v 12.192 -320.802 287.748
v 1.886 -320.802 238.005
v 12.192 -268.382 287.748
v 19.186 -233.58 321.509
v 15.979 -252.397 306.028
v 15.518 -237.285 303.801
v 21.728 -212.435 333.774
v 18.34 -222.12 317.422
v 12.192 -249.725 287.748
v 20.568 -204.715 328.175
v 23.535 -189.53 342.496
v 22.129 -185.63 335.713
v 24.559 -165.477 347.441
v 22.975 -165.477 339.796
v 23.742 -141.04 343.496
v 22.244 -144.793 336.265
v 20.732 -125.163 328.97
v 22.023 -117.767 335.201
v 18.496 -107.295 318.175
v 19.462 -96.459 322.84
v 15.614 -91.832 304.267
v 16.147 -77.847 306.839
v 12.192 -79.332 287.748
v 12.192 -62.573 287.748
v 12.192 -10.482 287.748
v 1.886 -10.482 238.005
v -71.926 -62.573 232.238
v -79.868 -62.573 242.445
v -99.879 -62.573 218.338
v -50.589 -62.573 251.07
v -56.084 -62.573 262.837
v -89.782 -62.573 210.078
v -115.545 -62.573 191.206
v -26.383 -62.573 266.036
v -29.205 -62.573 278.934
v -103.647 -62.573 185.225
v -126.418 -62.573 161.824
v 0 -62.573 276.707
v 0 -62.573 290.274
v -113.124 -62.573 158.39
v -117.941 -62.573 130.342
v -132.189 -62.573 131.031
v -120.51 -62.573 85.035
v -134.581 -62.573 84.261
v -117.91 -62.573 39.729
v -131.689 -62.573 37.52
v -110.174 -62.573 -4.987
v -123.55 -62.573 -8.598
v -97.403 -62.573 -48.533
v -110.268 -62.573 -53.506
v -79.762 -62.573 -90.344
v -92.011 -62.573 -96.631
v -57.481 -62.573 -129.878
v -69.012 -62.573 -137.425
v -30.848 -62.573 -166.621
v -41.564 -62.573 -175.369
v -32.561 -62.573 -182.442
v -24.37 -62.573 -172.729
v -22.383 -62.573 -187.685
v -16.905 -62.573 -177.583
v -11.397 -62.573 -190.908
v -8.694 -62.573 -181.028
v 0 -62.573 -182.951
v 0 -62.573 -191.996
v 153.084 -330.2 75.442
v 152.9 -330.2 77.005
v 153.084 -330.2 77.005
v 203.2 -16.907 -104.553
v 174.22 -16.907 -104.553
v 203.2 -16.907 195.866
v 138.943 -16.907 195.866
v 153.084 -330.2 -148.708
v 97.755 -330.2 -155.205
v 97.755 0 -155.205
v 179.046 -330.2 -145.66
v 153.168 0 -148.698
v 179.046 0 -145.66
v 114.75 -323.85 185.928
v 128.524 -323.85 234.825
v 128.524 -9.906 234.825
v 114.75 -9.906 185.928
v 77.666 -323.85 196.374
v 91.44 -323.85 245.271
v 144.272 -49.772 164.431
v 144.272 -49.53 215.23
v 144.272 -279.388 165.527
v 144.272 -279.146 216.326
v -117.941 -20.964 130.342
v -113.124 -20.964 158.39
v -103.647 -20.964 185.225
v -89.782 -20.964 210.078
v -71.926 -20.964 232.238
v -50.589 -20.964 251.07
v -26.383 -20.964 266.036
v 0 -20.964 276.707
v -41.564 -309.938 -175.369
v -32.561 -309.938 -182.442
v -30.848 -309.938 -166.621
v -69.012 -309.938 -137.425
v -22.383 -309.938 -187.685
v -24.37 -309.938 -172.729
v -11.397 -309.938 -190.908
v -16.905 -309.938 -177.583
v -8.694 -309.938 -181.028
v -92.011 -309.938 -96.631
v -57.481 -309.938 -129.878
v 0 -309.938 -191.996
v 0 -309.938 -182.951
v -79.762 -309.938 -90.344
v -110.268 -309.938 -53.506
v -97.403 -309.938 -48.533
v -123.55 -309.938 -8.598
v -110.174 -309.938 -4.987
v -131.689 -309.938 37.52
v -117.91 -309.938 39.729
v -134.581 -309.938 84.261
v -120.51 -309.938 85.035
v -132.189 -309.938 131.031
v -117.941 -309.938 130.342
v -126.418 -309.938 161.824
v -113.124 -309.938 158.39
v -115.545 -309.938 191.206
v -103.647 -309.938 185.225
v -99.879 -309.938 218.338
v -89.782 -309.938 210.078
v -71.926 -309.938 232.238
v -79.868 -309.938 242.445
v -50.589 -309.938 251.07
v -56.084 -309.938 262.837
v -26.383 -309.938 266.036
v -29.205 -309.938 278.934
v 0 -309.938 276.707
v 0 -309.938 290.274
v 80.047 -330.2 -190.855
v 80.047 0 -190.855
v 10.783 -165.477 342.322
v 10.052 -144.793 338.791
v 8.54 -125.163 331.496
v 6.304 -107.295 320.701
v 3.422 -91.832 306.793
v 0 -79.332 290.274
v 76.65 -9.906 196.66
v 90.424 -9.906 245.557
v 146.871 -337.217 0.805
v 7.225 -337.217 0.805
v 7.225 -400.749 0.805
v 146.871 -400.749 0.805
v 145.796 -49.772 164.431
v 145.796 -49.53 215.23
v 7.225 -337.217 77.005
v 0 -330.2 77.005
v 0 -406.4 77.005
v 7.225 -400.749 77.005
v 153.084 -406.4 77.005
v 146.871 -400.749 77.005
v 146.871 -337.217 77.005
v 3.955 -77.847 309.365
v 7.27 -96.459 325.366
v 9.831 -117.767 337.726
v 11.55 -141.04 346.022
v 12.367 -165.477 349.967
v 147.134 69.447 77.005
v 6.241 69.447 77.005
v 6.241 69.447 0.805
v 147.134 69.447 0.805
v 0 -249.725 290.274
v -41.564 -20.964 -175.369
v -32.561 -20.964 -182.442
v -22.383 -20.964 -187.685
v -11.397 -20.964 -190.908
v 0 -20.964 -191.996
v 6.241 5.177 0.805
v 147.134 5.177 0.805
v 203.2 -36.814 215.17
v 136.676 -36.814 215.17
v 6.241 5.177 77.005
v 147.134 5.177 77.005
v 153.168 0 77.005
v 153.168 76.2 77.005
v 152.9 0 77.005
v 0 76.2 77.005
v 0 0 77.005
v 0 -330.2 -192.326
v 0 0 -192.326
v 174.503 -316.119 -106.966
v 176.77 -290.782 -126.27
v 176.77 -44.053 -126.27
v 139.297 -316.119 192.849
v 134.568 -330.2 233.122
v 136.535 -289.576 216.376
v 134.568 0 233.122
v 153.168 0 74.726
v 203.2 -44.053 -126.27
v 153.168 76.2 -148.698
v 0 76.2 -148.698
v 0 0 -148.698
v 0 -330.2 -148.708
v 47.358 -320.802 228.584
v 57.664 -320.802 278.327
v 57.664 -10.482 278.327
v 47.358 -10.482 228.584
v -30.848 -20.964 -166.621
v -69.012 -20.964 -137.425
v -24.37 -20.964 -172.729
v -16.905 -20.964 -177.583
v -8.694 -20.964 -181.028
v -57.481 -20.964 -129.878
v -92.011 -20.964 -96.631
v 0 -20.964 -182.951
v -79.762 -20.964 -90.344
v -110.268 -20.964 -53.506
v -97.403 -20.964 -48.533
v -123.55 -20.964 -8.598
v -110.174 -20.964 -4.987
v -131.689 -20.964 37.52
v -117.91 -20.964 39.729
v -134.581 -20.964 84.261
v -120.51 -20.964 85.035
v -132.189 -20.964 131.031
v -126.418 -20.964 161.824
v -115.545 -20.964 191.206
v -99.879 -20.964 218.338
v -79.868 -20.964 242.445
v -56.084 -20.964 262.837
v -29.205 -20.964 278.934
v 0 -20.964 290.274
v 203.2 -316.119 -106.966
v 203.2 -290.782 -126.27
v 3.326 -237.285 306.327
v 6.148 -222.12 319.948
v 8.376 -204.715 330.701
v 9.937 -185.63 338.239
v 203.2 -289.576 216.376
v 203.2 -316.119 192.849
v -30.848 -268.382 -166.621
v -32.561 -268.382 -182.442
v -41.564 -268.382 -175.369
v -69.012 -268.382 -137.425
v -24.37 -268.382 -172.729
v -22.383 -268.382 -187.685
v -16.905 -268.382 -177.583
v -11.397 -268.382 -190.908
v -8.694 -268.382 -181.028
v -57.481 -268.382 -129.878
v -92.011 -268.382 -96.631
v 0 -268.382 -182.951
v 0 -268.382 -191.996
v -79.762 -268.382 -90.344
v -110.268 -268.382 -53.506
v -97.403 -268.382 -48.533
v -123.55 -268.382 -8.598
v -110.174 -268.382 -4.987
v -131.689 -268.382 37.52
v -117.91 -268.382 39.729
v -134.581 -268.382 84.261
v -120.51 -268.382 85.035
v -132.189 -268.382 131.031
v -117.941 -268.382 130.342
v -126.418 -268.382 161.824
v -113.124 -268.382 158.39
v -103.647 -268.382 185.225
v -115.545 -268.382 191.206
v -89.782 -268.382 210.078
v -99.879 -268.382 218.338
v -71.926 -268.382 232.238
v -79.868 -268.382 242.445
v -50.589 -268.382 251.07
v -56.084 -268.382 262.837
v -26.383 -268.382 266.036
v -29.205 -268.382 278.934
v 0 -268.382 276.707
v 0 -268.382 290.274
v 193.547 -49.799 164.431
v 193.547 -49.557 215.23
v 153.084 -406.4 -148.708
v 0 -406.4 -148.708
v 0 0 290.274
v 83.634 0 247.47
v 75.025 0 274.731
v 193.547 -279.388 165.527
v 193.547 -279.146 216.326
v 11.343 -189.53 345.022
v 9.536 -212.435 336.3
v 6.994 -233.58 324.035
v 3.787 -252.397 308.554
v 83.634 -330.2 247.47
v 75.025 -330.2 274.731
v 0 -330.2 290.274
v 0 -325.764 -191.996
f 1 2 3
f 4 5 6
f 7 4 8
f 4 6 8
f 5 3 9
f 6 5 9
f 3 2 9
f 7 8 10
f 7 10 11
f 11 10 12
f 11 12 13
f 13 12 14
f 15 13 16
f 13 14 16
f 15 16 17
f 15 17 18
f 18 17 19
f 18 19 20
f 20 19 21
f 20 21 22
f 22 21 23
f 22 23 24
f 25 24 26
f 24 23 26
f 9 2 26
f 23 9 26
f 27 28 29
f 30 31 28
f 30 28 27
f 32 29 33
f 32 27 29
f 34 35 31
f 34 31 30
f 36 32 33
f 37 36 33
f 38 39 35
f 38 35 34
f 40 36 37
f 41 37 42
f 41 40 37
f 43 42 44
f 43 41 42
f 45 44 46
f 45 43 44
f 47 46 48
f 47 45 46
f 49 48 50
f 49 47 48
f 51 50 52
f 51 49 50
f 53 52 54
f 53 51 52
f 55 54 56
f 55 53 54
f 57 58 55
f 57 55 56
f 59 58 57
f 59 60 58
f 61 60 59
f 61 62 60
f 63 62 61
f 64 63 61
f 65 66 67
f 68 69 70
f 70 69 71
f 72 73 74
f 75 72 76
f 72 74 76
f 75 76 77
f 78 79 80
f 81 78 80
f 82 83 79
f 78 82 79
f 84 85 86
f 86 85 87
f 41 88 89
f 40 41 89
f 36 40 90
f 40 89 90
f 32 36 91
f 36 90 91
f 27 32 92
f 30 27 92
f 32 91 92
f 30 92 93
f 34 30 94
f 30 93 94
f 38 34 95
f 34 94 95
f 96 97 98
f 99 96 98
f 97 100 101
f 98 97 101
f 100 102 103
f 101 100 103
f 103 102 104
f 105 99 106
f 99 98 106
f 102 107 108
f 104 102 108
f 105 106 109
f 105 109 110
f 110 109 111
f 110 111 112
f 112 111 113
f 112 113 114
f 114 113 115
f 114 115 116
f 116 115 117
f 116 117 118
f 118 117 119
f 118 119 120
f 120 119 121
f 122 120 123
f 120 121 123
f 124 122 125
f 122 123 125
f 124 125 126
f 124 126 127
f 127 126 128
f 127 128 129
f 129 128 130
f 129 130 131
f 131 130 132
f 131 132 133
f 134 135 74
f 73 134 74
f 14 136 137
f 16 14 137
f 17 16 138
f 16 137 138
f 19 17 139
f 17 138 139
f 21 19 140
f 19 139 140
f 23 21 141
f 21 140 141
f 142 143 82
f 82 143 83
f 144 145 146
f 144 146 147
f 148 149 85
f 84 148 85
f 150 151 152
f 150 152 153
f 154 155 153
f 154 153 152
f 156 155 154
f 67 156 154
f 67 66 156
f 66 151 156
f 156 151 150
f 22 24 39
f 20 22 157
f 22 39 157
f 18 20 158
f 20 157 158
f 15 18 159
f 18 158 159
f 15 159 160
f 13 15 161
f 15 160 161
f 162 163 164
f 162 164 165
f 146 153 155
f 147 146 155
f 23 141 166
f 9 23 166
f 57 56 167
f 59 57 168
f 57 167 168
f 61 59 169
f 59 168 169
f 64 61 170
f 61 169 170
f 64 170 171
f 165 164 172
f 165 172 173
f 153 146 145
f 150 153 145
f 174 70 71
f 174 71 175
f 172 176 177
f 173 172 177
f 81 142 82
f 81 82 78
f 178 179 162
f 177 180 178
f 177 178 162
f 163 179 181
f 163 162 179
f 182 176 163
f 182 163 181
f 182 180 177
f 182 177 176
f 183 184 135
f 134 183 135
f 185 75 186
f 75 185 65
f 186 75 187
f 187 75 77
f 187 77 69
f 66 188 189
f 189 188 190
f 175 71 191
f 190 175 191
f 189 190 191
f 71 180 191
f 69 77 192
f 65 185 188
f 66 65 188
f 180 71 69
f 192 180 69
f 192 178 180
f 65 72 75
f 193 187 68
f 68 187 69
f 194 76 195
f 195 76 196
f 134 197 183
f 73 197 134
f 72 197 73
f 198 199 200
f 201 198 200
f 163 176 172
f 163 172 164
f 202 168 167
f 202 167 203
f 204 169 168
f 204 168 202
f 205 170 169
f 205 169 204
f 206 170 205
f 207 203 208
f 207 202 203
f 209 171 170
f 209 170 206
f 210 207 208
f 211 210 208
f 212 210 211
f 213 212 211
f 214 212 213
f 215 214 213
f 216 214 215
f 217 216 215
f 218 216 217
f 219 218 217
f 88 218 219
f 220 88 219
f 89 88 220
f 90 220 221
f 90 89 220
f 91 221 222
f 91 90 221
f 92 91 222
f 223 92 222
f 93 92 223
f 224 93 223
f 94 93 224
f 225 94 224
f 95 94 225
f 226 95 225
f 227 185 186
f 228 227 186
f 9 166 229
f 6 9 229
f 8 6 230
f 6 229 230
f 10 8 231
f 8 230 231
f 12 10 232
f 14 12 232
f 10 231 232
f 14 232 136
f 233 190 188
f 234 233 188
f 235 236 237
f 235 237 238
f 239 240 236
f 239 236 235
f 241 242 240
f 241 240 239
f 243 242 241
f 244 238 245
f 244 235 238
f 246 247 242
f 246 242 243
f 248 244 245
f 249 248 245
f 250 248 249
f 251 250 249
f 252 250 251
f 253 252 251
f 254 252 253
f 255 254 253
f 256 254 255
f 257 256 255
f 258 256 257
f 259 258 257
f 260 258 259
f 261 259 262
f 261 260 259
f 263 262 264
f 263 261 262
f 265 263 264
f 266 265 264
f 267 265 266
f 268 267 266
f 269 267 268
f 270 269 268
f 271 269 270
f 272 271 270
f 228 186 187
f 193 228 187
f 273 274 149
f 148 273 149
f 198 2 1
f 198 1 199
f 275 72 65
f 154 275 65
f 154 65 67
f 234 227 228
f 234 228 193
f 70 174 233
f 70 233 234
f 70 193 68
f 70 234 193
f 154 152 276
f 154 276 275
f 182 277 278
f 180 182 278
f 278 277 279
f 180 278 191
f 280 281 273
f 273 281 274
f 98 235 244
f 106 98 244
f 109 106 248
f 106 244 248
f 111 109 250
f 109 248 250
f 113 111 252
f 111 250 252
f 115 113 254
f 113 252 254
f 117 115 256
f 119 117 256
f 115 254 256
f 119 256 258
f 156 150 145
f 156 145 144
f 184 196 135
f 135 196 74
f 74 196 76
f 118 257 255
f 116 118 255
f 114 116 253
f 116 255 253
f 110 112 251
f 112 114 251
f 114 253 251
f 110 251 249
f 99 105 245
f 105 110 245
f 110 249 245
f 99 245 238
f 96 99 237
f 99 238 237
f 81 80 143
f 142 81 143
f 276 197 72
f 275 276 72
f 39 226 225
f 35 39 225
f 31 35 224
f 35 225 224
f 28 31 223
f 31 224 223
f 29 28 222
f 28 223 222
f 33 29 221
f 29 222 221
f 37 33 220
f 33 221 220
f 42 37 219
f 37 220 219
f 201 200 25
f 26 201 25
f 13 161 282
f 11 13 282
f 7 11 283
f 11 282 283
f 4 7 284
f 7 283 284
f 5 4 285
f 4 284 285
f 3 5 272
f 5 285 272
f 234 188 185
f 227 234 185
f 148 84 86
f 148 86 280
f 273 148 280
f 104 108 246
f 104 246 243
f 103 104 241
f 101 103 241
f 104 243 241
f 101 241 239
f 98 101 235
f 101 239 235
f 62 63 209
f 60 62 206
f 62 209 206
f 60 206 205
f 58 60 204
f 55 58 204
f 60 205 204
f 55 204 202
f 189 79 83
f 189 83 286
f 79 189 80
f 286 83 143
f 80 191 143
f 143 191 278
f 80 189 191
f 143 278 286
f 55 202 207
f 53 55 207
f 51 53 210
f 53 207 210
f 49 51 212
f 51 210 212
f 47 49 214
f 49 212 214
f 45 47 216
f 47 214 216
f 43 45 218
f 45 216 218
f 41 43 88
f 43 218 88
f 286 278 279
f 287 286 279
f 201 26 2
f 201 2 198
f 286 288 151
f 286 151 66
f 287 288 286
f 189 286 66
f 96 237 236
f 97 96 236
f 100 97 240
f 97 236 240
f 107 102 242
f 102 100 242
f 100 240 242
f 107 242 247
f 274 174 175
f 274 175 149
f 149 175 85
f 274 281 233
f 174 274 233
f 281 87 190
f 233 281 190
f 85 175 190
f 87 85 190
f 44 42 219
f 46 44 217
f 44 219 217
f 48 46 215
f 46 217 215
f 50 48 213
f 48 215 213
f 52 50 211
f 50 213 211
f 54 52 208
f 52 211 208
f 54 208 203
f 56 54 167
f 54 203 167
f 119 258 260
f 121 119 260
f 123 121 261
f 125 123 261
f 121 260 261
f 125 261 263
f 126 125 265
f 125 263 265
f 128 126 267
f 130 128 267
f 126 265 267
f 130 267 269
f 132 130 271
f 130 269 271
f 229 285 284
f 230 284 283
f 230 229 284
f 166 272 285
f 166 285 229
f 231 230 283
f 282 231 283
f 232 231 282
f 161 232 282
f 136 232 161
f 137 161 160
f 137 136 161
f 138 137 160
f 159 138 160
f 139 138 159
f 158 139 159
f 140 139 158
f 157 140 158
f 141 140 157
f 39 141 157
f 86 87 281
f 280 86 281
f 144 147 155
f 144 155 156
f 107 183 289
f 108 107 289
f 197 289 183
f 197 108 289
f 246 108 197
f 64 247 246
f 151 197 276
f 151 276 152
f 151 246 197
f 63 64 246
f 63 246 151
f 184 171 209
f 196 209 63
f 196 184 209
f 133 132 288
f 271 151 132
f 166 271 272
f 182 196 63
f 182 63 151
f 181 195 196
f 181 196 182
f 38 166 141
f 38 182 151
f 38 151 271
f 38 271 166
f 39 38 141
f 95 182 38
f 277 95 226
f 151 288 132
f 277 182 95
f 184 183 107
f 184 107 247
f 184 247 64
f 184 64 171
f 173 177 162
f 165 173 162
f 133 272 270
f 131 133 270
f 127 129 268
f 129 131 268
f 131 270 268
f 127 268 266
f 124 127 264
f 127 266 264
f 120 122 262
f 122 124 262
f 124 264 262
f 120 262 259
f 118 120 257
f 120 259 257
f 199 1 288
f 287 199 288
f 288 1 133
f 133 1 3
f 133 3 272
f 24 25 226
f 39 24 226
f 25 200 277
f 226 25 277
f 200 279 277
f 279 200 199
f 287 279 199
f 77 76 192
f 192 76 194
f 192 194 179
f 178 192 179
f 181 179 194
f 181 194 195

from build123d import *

# Parameters (mm, degrees)
F1_DEPTH  = 330.2
F3_DEPTH  = 203.2
F4_W      = 41.5566265583
F4_H      = 483.5203289986
F5_DEPTH  = 139.7
F8_DEPTH  = 304.8
F9_DEPTH  = 304.8
F13_DEPTH = 50.8
F14_DEPTH = 50.8
F15_DEPTH = 50.8
F16_W     = 12.4509147432
F16_H     = 205.8088108897
F17_DEPTH = 60.96
F19_DEPTH = 25.4
F20_DEPTH = 25.4
F21_W     = 153.1679212224
F21_H     = 225.7029655442
F22_DEPTH = 76.2
F23_W     = 153.0837979386
F23_H     = 225.7128436606
F24_DEPTH = 76.2
F25_W     = 139.6465194412
F25_H     = 63.5316371918
F26_DEPTH = 76.2
F27_W     = 140.8935589716
F27_H     = 64.2704893835
F28_DEPTH = 76.2


with BuildPart() as f1:
    # F0 (on Front) → F1 (new body)
    with BuildSketch(Plane.XZ):
        Polygon((75.0250443816, 274.7305631638), (0, 290.2742098035), (0, -192.3257901965), (80.0467804074, -190.855011344), (97.7545654154, -155.2051532254), (179.0464967489, -145.659506321), (134.568348527, 233.1220060587), (83.6337208748, 247.4697828293), align=None)
    extrude(amount=F1_DEPTH)

    # F2 (on Right) → F3 (join)
    with BuildSketch(Plane.YZ):
        Polygon((-36.8141271174, 215.1695936918), (-289.5758748055, 216.376081109), (-316.1188662052, 192.8493380547), (-316.1188662052, -106.9659143686), (-290.7823622227, -126.2699067593), (-44.0531261265, -126.2699067593), (-16.9068686664, -104.5529171824), (-16.9068686664, 195.8655864), align=None)
    extrude(amount=F3_DEPTH)

    # F4 (on Right) → F5 (join)
    with BuildSketch(Plane.YZ):
        Polygon((-20.9644548595, -191.9956207275), (-20.9644548595, 291.524708271), (-62.5730231404, 291.524708271), (-62.5730231404, -191.9956207275), (-26.7035681754, -191.9956207275), align=None)
        with Locations((-289.1601473093, 49.7645437717)):
            Rectangle(F4_W, F4_H)
    extrude(amount=-F5_DEPTH)

    # F7 (on face) → F8 (cut)
    with BuildSketch(Plane(origin=(0, -20.9644548595, 0), x_dir=(-1, 0, 0), z_dir=(0, 1, 0))):
        with BuildLine():
            Line((0, 291.524708271), (0, 290.2742098035))
            ThreePointArc((0, 290.2742098035), (90.3834546734, 230.8148027656), (132.1892142296, 131.0306936502))
            ThreePointArc((132.1892142296, 131.0306936502), (117.5430207962, -31.2395021377), (41.5639653802, -175.3689944744))
            ThreePointArc((41.5639653802, -175.3689944744), (22.3830735082, -187.6847842501), (0, -191.9956207275))
            Line((0, -191.9956207275), (139.7, -191.9956207275))
            Line((139.7, -191.9956207275), (139.7, 291.524708271))
            Line((139.7, 291.524708271), (0, 291.524708271))
        make_face()
    extrude(amount=-F8_DEPTH, mode=Mode.SUBTRACT)

    # F7 (on face) → F9 (cut)
    with BuildSketch(Plane(origin=(0, -20.9644548595, 0), x_dir=(-1, 0, 0), z_dir=(0, 1, 0))):
        with BuildLine():
            ThreePointArc((30.8481585234, -166.6212230921), (104.4091983221, -26.9422304703), (117.9412454367, 130.3420066833))
            ThreePointArc((117.9412454367, 130.3420066833), (81.3233643675, 221.5363124881), (0, 276.7067849636))
            Line((0, 276.7067849636), (0, -182.9511970282))
            ThreePointArc((0, -182.9511970282), (16.9048608228, -177.5834823958), (30.8481585234, -166.6212230921))
        make_face()
    extrude(amount=-F9_DEPTH, mode=Mode.SUBTRACT)

    # F12 (on face) → F13 (cut)
    with BuildSketch(Plane(origin=(0, 1.026189658, 214.9889735368), x_dir=(1, 0, 0), z_dir=(0, 0.0047731656, 0.9999886084))):
        Polygon((193.5474094368, -50.5835317066), (145.7960009575, -50.5567677319), (144.2719995975, -50.5567677319), (144.2719995975, -280.1753878593), (193.5474094368, -280.1753878593), align=None)
    extrude(amount=-F13_DEPTH, mode=Mode.SUBTRACT)

    # F10 (on face) → F14 (cut)
    with BuildSketch(Plane(origin=(57.6637293587, 0, 278.3274706783), x_dir=(0.9792054246, 0, -0.202871231), z_dir=(0.202871231, 0, 0.9792054246))):
        Polygon((0, -10.4822274297), (-44.3622209132, -10.4822274297), (-46.4373715222, -10.4822274297), (-46.4373715222, -320.8020031452), (0, -320.8020031452), align=None)
    extrude(amount=-F14_DEPTH, mode=Mode.SUBTRACT)

    # F11 (on face) → F15 (cut)
    with BuildSketch(Plane(origin=(70.7334014159, 0, 251.1036741994), x_dir=(0.9625404698, 0, -0.2711380534), z_dir=(0.2711380534, 0, 0.9625404698))):
        Polygon((60.0396618247, -9.9059985951), (20.4569026828, -9.9059985951), (21.5124394745, -323.8500058651), (60.0396618247, -323.8500058651), align=None)
    extrude(amount=-F15_DEPTH, mode=Mode.SUBTRACT)

    # F16 (on face) → F17 (join)
    with BuildSketch(Plane(origin=(57.6637293587, 0, 278.3274706783), x_dir=(0.9792054246, 0, -0.202871231), z_dir=(0.202871231, 0, 0.9792054246))):
        with Locations((-52.6628288938, -165.4774285853)):
            Rectangle(F16_W, F16_H)
    extrude(amount=F17_DEPTH)

    # F18 (on face) → F19 (cut)
    with BuildSketch(Plane(origin=(-57.6637293587, 0, 11.9467391251), x_dir=(0, -1, 0), z_dir=(-0.9792054246, 0, 0.202871231))):
        with BuildLine():
            ThreePointArc((62.5730231404, 284.2380808719), (106.8196773219, 326.8815108015), (165.4774285853, 345.1980808719))
            Line((165.4774285853, 345.1980808719), (62.5730231404, 345.1980808719))
            Line((62.5730231404, 345.1980808719), (62.5730231404, 284.2380808719))
        make_face()
        with BuildLine():
            Line((268.3818340302, 345.1980808719), (165.4774285853, 345.1980808719))
            ThreePointArc((165.4774285853, 345.1980808719), (223.2646342428, 325.4119737611), (268.3818340302, 284.2380808719))
            Line((268.3818340302, 284.2380808719), (268.3818340302, 345.1980808719))
        make_face()
    extrude(amount=-F19_DEPTH, mode=Mode.SUBTRACT)

    # F18 (on face) → F20 (cut)
    with BuildSketch(Plane(origin=(-57.6637293587, 0, 11.9467391251), x_dir=(0, -1, 0), z_dir=(-0.9792054246, 0, 0.202871231))):
        with BuildLine():
            ThreePointArc((165.4774285853, 337.3909592628), (115.9669465301, 321.2480632926), (79.3316885829, 284.2380808719))
            Line((79.3316885829, 284.2380808719), (249.7253417969, 284.2380808719))
            ThreePointArc((249.7253417969, 284.2380808719), (213.6637620757, 320.4234559725), (165.4774285853, 337.3909592628))
        make_face()
    extrude(amount=-F20_DEPTH, mode=Mode.SUBTRACT)

    # F21 (on face) → F22 (join)
    with BuildSketch(Plane(origin=(0, 0, 0), x_dir=(-1, 0, 0), z_dir=(0, 1, 0))):
        with Locations((-76.5839606112, -35.8467967741)):
            Rectangle(F21_W, F21_H)
    extrude(amount=F22_DEPTH)

    # F23 (on face) → F24 (join)
    with BuildSketch(Plane.XZ.offset(330.2)):
        with Locations((76.5418989693, -35.8517358323)):
            Rectangle(F23_W, F23_H)
    extrude(amount=F24_DEPTH)

    # F25 (on face) → F26 (cut)
    with BuildSketch(Plane.XY.offset(77.004685998)):
        with Locations((77.0478153136, -368.982732296)):
            Rectangle(F25_W, F25_H)
    extrude(amount=-F26_DEPTH, mode=Mode.SUBTRACT)

    # F27 (on face) → F28 (cut)
    with BuildSketch(Plane.XY.offset(77.004685998)):
        with Locations((76.6873457469, 37.3120044824)):
            Rectangle(F27_W, F27_H)
    extrude(amount=-F28_DEPTH, mode=Mode.SUBTRACT)


solid = f1.part
